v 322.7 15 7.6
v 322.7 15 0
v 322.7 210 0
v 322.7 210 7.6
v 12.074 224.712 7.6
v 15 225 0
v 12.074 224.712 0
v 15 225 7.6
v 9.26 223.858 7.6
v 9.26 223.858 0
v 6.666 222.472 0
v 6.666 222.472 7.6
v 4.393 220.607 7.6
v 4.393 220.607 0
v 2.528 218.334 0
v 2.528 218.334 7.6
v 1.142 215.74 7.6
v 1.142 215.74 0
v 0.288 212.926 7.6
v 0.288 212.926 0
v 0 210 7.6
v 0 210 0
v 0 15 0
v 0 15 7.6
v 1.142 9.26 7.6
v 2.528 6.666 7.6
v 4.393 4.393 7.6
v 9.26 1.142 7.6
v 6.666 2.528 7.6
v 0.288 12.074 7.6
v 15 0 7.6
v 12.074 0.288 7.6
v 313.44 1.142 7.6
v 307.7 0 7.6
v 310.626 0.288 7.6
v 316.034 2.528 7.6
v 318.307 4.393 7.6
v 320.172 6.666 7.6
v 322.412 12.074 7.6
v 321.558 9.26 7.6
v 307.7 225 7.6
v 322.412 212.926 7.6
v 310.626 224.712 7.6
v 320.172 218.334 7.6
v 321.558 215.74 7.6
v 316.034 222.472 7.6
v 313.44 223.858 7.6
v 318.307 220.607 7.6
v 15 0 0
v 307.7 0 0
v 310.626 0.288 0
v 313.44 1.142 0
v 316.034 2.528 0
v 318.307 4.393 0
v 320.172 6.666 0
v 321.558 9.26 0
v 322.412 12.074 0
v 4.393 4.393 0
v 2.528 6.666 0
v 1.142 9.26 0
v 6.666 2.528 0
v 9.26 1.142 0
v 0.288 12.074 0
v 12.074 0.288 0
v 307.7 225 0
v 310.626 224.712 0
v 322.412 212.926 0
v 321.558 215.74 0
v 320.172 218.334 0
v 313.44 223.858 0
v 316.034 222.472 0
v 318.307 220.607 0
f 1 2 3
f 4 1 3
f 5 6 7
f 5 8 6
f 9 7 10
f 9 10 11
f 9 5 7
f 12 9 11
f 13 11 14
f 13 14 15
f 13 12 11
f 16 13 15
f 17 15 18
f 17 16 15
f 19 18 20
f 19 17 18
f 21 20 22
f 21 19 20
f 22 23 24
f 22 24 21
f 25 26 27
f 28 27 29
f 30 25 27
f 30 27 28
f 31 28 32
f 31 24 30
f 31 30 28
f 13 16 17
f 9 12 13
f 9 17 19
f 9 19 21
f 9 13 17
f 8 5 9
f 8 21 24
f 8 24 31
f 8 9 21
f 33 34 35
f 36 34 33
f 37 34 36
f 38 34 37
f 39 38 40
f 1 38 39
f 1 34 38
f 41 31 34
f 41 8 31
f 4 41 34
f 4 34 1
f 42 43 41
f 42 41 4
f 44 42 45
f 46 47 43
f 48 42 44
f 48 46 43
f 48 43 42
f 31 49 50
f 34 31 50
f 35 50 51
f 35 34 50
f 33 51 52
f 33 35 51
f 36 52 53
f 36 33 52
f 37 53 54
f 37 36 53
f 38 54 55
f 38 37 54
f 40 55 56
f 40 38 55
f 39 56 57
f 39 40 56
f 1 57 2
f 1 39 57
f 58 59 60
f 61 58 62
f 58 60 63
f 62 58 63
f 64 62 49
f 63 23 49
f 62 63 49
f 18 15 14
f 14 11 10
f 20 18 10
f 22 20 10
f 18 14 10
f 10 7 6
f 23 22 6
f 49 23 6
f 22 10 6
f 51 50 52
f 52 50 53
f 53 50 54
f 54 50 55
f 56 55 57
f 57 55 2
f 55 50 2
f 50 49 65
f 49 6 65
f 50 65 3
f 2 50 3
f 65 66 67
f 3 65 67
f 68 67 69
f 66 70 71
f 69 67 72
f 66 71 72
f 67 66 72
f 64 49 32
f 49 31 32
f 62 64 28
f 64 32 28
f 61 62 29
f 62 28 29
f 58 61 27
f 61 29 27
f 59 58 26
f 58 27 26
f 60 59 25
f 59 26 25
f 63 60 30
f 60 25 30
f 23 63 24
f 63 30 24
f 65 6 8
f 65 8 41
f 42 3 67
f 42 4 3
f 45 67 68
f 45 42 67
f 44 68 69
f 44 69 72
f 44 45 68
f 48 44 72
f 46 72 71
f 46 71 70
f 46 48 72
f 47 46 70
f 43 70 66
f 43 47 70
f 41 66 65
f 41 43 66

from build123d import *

# Parameters (mm, degrees)
RECTANGLE_W   = 322.7
RECTANGLE_H   = 225
EXTRUDE_DEPTH = 7.6
FILLET_R      = 15
FILLET001_R   = 15
FILLET002_R   = 15
FILLET003_R   = 15


with BuildPart() as part:
    # Rectangle → Extrude (new body)
    with BuildSketch(Plane.XY):
        with Locations((161.35, 112.5)):
            Rectangle(RECTANGLE_W, RECTANGLE_H)
    extrude(amount=EXTRUDE_DEPTH)

    # Fillet
    fillet_edges = [part.edges().sort_by_distance(p)[0] for p in [
        (322.7, 0, 3.8),
    ]]
    fillet(fillet_edges, radius=FILLET_R)

    # Fillet001
    fillet001_edges = [part.edges().sort_by_distance(p)[0] for p in [
        (0, 0, 3.8),
    ]]
    fillet(fillet001_edges, radius=FILLET001_R)

    # Fillet002
    fillet002_edges = [part.edges().sort_by_distance(p)[0] for p in [
        (322.7, 225, 3.8),
    ]]
    fillet(fillet002_edges, radius=FILLET002_R)

    # Fillet003
    fillet003_edges = [part.edges().sort_by_distance(p)[0] for p in [
        (0, 225, 3.8),
    ]]
    fillet(fillet003_edges, radius=FILLET003_R)


solid = part.part
